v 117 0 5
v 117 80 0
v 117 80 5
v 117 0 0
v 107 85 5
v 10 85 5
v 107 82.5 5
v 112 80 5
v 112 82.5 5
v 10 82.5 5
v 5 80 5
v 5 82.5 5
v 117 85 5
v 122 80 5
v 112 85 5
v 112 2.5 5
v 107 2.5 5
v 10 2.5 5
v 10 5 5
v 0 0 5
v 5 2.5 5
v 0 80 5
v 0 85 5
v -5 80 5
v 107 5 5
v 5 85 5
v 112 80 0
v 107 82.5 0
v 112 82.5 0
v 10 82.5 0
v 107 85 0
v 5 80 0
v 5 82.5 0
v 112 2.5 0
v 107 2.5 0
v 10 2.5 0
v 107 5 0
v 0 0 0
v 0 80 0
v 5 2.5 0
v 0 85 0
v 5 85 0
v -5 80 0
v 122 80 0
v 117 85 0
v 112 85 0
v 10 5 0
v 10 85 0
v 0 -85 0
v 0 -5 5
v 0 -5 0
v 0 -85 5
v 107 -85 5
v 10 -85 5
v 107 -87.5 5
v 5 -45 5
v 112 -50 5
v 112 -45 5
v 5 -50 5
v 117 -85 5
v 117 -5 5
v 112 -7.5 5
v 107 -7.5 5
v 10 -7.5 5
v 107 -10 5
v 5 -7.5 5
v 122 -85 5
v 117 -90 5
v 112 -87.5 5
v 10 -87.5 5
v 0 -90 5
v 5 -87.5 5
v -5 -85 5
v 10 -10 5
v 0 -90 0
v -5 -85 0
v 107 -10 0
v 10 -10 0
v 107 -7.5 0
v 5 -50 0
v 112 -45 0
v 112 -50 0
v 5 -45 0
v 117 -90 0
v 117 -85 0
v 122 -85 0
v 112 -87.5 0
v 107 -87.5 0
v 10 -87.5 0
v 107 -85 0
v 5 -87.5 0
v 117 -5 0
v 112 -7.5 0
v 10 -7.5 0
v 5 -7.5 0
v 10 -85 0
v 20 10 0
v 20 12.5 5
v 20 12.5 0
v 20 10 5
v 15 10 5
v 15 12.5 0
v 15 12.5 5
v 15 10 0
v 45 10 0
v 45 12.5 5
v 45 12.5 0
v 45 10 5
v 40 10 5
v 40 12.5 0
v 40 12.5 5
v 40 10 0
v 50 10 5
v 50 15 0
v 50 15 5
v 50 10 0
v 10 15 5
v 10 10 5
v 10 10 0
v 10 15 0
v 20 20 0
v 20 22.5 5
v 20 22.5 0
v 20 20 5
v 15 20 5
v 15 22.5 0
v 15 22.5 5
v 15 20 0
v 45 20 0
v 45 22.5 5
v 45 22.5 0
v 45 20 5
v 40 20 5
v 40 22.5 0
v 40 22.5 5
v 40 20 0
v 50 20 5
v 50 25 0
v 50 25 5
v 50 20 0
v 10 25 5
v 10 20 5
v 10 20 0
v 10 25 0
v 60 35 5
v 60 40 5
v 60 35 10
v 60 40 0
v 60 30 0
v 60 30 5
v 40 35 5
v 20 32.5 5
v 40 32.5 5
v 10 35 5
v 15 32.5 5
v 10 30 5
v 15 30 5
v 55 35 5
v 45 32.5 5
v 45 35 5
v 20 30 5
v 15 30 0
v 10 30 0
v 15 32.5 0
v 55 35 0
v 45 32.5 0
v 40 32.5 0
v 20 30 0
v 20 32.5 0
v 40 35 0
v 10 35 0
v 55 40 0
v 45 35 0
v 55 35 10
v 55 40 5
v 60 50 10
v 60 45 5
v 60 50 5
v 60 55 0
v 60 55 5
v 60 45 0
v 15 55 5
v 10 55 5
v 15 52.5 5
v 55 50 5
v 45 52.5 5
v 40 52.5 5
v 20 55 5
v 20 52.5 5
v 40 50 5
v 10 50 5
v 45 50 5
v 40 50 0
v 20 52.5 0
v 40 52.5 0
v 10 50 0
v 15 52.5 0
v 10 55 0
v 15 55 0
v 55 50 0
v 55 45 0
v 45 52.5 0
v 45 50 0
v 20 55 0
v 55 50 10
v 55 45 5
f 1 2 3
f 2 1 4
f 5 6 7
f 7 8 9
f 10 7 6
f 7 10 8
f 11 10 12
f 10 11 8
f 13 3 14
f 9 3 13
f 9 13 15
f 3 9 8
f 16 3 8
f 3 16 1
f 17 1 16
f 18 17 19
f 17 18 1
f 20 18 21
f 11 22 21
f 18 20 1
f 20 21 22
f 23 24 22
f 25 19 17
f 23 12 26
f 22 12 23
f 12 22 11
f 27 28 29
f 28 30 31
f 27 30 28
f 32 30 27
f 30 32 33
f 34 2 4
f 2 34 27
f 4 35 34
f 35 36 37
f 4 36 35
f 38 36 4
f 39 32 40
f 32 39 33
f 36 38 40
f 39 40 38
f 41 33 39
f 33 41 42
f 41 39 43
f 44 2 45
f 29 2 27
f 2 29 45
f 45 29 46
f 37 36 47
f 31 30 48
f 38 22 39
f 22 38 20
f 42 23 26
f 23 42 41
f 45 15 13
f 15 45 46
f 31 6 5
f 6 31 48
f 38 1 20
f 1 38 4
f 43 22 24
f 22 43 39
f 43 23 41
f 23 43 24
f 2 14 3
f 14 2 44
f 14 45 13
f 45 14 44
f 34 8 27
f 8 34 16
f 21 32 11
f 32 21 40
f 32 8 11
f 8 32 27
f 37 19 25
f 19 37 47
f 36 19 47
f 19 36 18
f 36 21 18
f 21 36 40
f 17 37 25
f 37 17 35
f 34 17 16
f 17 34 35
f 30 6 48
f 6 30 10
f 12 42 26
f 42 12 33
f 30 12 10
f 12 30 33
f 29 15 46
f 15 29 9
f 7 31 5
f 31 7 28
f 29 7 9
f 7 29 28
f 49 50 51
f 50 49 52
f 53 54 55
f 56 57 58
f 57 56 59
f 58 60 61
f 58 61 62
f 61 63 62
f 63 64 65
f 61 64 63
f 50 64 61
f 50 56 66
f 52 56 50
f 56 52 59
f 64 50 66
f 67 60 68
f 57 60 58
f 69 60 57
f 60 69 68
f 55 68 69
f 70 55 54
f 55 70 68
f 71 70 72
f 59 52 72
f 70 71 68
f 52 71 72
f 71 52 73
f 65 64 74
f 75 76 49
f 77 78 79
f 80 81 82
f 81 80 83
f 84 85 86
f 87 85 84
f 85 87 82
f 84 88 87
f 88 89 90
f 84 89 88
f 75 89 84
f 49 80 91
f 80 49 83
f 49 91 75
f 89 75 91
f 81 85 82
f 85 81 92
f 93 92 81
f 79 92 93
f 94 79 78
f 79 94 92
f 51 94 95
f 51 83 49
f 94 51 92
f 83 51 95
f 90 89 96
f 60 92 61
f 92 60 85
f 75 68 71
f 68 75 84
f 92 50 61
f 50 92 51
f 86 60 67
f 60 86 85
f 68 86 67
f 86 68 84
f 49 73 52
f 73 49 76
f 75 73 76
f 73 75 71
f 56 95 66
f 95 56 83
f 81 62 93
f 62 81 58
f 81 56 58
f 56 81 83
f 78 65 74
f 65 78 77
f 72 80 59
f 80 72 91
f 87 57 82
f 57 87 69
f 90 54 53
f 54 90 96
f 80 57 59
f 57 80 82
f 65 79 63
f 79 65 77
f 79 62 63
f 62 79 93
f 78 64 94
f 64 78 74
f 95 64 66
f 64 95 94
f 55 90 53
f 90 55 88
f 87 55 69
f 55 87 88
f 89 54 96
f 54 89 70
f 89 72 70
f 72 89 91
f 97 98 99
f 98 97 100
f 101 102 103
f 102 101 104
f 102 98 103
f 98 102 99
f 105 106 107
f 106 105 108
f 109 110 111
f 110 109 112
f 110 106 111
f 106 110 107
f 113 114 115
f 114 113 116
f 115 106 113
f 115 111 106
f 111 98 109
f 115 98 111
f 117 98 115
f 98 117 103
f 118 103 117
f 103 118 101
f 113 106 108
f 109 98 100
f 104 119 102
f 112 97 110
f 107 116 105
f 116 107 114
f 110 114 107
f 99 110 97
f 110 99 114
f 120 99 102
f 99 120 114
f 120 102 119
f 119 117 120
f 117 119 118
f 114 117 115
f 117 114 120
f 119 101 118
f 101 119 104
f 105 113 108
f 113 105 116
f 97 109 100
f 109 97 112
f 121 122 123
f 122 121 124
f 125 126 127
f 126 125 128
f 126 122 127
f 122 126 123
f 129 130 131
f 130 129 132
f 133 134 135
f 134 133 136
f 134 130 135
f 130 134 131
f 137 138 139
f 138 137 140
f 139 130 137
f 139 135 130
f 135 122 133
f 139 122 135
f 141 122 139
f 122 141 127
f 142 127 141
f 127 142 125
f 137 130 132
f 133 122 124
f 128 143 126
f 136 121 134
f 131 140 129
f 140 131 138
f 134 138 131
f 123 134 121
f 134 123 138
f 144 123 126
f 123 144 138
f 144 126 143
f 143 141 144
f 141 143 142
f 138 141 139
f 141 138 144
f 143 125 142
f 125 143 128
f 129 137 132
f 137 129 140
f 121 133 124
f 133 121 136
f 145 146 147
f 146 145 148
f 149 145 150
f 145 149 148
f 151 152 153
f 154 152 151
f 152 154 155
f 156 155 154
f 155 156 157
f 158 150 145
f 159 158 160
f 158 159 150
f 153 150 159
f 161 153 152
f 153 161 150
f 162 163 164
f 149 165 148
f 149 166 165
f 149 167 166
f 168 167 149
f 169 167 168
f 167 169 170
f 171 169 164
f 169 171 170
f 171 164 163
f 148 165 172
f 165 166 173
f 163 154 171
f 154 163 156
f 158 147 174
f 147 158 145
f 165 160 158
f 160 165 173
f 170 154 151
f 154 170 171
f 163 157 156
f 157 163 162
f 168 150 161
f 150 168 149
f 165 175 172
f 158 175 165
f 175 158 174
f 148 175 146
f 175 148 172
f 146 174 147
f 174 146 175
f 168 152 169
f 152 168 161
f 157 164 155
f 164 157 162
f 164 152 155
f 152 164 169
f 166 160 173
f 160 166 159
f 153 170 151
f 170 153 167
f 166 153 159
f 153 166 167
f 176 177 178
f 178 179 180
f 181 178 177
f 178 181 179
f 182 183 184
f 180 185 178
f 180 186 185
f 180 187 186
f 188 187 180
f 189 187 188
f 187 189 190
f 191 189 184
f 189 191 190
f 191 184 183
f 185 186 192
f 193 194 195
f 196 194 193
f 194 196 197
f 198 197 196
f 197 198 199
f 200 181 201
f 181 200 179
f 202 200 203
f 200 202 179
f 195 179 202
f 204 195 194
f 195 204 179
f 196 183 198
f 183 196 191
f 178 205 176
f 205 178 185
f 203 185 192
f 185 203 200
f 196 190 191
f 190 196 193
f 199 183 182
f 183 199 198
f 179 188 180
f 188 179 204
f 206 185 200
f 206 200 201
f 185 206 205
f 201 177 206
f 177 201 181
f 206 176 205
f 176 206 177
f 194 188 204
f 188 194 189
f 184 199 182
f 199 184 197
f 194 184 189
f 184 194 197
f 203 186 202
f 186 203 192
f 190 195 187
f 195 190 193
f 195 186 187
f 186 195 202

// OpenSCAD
// file: wall_light.scad
$fn = 60;

module frame2()
{
    difference()
    {
        union()
        {
            cube([ 117, 85, 5 ]);
            linear_extrude(height = 5) polygon(points = [ [ 0, 80 ], [ 0, 85 ], [ -5, 80 ] ]);
            linear_extrude(height = 5) polygon(points = [ [ 117, 80 ], [ 117, 85 ], [ 122, 80 ] ]);
        }
        union()
        {
            translate([ 5, 5, -5 ]) cube([ 107, 35, 15 ]);
            translate([ 5, 45, -5 ]) cube([ 107, 35, 15 ]);

            translate([ 5, 2.5, -5 ]) cube([ 5, 5, 15 ]);
            translate([ 107, 2.5, -5 ]) cube([ 5, 5, 15 ]);

            translate([ 5, 77.5, -5 ]) cube([ 5, 5, 15 ]);
            translate([ 107, 77.5, -5 ]) cube([ 5, 5, 15 ]);
        }
    }
}

module frame1()
{
    difference()
    {
        union()
        {
            cube([ 117, 85, 5 ]);
            linear_extrude(height = 5) polygon(points = [ [ 0, 80 ], [ 0, 85 ], [ -5, 80 ] ]);
            linear_extrude(height = 5) polygon(points = [ [ 117, 80 ], [ 117, 85 ], [ 122, 80 ] ]);
        }
        union()
        {
            translate([ 5, 5, -5 ]) cube([ 107, 75, 15 ]);

            translate([ 5, 2.5, -5 ]) cube([ 5, 5, 15 ]);
            translate([ 107, 2.5, -5 ]) cube([ 5, 5, 15 ]);

            translate([ 5, 42.5, -5 ]) cube([ 5, 5, 15 ]);
            translate([ 107, 42.5, -5 ]) cube([ 5, 5, 15 ]);

            translate([ 5, 82.5, -5 ]) cube([ 5, 5, 15 ]);
            translate([ 107, 82.5, -5 ]) cube([ 5, 5, 15 ]);
        }
    }
}

module support_short()
{
    difference()
    {
        cube([ 40, 5, 5 ]);

        union()
        {
            translate([ 5, -2.5, -5 ]) cube([ 5, 5, 15 ]);
            translate([ 30, -2.5, -5 ]) cube([ 5, 5, 15 ]);
        }
    }
}

module support_top_right()
{
    difference()
    {
        union()
        {
            cube([ 50, 5, 5 ]);
            translate([ 45, 5, 0 ]) cube([ 5, 5, 5 ]);
            translate([ 45, 5, 5 ]) rotate([0,90,0])linear_extrude(height = 5) polygon(points = [ [ 0, 0 ], [ 0, 5 ], [ -5, 0 ] ]);
        }
        union()
        {
            translate([ 5, -2.5, -5 ]) cube([ 5, 5, 15 ]);
            translate([ 30, 2.5, -5 ]) cube([ 5, 5, 15 ]);
        }
    }
}

module support_top_left()
{
    mirror([0,1,0]) support_top_right();
}
// main file
$fn = 60;
include <wall_light.scad>

frame1();
translate([117,-5,0]) rotate([0,0,180]) frame2();
translate([10,10,0]) support_short();
translate([10,20,0]) support_short();
translate([10,30,0]) support_top_right();
translate([10,55,0]) support_top_left();
